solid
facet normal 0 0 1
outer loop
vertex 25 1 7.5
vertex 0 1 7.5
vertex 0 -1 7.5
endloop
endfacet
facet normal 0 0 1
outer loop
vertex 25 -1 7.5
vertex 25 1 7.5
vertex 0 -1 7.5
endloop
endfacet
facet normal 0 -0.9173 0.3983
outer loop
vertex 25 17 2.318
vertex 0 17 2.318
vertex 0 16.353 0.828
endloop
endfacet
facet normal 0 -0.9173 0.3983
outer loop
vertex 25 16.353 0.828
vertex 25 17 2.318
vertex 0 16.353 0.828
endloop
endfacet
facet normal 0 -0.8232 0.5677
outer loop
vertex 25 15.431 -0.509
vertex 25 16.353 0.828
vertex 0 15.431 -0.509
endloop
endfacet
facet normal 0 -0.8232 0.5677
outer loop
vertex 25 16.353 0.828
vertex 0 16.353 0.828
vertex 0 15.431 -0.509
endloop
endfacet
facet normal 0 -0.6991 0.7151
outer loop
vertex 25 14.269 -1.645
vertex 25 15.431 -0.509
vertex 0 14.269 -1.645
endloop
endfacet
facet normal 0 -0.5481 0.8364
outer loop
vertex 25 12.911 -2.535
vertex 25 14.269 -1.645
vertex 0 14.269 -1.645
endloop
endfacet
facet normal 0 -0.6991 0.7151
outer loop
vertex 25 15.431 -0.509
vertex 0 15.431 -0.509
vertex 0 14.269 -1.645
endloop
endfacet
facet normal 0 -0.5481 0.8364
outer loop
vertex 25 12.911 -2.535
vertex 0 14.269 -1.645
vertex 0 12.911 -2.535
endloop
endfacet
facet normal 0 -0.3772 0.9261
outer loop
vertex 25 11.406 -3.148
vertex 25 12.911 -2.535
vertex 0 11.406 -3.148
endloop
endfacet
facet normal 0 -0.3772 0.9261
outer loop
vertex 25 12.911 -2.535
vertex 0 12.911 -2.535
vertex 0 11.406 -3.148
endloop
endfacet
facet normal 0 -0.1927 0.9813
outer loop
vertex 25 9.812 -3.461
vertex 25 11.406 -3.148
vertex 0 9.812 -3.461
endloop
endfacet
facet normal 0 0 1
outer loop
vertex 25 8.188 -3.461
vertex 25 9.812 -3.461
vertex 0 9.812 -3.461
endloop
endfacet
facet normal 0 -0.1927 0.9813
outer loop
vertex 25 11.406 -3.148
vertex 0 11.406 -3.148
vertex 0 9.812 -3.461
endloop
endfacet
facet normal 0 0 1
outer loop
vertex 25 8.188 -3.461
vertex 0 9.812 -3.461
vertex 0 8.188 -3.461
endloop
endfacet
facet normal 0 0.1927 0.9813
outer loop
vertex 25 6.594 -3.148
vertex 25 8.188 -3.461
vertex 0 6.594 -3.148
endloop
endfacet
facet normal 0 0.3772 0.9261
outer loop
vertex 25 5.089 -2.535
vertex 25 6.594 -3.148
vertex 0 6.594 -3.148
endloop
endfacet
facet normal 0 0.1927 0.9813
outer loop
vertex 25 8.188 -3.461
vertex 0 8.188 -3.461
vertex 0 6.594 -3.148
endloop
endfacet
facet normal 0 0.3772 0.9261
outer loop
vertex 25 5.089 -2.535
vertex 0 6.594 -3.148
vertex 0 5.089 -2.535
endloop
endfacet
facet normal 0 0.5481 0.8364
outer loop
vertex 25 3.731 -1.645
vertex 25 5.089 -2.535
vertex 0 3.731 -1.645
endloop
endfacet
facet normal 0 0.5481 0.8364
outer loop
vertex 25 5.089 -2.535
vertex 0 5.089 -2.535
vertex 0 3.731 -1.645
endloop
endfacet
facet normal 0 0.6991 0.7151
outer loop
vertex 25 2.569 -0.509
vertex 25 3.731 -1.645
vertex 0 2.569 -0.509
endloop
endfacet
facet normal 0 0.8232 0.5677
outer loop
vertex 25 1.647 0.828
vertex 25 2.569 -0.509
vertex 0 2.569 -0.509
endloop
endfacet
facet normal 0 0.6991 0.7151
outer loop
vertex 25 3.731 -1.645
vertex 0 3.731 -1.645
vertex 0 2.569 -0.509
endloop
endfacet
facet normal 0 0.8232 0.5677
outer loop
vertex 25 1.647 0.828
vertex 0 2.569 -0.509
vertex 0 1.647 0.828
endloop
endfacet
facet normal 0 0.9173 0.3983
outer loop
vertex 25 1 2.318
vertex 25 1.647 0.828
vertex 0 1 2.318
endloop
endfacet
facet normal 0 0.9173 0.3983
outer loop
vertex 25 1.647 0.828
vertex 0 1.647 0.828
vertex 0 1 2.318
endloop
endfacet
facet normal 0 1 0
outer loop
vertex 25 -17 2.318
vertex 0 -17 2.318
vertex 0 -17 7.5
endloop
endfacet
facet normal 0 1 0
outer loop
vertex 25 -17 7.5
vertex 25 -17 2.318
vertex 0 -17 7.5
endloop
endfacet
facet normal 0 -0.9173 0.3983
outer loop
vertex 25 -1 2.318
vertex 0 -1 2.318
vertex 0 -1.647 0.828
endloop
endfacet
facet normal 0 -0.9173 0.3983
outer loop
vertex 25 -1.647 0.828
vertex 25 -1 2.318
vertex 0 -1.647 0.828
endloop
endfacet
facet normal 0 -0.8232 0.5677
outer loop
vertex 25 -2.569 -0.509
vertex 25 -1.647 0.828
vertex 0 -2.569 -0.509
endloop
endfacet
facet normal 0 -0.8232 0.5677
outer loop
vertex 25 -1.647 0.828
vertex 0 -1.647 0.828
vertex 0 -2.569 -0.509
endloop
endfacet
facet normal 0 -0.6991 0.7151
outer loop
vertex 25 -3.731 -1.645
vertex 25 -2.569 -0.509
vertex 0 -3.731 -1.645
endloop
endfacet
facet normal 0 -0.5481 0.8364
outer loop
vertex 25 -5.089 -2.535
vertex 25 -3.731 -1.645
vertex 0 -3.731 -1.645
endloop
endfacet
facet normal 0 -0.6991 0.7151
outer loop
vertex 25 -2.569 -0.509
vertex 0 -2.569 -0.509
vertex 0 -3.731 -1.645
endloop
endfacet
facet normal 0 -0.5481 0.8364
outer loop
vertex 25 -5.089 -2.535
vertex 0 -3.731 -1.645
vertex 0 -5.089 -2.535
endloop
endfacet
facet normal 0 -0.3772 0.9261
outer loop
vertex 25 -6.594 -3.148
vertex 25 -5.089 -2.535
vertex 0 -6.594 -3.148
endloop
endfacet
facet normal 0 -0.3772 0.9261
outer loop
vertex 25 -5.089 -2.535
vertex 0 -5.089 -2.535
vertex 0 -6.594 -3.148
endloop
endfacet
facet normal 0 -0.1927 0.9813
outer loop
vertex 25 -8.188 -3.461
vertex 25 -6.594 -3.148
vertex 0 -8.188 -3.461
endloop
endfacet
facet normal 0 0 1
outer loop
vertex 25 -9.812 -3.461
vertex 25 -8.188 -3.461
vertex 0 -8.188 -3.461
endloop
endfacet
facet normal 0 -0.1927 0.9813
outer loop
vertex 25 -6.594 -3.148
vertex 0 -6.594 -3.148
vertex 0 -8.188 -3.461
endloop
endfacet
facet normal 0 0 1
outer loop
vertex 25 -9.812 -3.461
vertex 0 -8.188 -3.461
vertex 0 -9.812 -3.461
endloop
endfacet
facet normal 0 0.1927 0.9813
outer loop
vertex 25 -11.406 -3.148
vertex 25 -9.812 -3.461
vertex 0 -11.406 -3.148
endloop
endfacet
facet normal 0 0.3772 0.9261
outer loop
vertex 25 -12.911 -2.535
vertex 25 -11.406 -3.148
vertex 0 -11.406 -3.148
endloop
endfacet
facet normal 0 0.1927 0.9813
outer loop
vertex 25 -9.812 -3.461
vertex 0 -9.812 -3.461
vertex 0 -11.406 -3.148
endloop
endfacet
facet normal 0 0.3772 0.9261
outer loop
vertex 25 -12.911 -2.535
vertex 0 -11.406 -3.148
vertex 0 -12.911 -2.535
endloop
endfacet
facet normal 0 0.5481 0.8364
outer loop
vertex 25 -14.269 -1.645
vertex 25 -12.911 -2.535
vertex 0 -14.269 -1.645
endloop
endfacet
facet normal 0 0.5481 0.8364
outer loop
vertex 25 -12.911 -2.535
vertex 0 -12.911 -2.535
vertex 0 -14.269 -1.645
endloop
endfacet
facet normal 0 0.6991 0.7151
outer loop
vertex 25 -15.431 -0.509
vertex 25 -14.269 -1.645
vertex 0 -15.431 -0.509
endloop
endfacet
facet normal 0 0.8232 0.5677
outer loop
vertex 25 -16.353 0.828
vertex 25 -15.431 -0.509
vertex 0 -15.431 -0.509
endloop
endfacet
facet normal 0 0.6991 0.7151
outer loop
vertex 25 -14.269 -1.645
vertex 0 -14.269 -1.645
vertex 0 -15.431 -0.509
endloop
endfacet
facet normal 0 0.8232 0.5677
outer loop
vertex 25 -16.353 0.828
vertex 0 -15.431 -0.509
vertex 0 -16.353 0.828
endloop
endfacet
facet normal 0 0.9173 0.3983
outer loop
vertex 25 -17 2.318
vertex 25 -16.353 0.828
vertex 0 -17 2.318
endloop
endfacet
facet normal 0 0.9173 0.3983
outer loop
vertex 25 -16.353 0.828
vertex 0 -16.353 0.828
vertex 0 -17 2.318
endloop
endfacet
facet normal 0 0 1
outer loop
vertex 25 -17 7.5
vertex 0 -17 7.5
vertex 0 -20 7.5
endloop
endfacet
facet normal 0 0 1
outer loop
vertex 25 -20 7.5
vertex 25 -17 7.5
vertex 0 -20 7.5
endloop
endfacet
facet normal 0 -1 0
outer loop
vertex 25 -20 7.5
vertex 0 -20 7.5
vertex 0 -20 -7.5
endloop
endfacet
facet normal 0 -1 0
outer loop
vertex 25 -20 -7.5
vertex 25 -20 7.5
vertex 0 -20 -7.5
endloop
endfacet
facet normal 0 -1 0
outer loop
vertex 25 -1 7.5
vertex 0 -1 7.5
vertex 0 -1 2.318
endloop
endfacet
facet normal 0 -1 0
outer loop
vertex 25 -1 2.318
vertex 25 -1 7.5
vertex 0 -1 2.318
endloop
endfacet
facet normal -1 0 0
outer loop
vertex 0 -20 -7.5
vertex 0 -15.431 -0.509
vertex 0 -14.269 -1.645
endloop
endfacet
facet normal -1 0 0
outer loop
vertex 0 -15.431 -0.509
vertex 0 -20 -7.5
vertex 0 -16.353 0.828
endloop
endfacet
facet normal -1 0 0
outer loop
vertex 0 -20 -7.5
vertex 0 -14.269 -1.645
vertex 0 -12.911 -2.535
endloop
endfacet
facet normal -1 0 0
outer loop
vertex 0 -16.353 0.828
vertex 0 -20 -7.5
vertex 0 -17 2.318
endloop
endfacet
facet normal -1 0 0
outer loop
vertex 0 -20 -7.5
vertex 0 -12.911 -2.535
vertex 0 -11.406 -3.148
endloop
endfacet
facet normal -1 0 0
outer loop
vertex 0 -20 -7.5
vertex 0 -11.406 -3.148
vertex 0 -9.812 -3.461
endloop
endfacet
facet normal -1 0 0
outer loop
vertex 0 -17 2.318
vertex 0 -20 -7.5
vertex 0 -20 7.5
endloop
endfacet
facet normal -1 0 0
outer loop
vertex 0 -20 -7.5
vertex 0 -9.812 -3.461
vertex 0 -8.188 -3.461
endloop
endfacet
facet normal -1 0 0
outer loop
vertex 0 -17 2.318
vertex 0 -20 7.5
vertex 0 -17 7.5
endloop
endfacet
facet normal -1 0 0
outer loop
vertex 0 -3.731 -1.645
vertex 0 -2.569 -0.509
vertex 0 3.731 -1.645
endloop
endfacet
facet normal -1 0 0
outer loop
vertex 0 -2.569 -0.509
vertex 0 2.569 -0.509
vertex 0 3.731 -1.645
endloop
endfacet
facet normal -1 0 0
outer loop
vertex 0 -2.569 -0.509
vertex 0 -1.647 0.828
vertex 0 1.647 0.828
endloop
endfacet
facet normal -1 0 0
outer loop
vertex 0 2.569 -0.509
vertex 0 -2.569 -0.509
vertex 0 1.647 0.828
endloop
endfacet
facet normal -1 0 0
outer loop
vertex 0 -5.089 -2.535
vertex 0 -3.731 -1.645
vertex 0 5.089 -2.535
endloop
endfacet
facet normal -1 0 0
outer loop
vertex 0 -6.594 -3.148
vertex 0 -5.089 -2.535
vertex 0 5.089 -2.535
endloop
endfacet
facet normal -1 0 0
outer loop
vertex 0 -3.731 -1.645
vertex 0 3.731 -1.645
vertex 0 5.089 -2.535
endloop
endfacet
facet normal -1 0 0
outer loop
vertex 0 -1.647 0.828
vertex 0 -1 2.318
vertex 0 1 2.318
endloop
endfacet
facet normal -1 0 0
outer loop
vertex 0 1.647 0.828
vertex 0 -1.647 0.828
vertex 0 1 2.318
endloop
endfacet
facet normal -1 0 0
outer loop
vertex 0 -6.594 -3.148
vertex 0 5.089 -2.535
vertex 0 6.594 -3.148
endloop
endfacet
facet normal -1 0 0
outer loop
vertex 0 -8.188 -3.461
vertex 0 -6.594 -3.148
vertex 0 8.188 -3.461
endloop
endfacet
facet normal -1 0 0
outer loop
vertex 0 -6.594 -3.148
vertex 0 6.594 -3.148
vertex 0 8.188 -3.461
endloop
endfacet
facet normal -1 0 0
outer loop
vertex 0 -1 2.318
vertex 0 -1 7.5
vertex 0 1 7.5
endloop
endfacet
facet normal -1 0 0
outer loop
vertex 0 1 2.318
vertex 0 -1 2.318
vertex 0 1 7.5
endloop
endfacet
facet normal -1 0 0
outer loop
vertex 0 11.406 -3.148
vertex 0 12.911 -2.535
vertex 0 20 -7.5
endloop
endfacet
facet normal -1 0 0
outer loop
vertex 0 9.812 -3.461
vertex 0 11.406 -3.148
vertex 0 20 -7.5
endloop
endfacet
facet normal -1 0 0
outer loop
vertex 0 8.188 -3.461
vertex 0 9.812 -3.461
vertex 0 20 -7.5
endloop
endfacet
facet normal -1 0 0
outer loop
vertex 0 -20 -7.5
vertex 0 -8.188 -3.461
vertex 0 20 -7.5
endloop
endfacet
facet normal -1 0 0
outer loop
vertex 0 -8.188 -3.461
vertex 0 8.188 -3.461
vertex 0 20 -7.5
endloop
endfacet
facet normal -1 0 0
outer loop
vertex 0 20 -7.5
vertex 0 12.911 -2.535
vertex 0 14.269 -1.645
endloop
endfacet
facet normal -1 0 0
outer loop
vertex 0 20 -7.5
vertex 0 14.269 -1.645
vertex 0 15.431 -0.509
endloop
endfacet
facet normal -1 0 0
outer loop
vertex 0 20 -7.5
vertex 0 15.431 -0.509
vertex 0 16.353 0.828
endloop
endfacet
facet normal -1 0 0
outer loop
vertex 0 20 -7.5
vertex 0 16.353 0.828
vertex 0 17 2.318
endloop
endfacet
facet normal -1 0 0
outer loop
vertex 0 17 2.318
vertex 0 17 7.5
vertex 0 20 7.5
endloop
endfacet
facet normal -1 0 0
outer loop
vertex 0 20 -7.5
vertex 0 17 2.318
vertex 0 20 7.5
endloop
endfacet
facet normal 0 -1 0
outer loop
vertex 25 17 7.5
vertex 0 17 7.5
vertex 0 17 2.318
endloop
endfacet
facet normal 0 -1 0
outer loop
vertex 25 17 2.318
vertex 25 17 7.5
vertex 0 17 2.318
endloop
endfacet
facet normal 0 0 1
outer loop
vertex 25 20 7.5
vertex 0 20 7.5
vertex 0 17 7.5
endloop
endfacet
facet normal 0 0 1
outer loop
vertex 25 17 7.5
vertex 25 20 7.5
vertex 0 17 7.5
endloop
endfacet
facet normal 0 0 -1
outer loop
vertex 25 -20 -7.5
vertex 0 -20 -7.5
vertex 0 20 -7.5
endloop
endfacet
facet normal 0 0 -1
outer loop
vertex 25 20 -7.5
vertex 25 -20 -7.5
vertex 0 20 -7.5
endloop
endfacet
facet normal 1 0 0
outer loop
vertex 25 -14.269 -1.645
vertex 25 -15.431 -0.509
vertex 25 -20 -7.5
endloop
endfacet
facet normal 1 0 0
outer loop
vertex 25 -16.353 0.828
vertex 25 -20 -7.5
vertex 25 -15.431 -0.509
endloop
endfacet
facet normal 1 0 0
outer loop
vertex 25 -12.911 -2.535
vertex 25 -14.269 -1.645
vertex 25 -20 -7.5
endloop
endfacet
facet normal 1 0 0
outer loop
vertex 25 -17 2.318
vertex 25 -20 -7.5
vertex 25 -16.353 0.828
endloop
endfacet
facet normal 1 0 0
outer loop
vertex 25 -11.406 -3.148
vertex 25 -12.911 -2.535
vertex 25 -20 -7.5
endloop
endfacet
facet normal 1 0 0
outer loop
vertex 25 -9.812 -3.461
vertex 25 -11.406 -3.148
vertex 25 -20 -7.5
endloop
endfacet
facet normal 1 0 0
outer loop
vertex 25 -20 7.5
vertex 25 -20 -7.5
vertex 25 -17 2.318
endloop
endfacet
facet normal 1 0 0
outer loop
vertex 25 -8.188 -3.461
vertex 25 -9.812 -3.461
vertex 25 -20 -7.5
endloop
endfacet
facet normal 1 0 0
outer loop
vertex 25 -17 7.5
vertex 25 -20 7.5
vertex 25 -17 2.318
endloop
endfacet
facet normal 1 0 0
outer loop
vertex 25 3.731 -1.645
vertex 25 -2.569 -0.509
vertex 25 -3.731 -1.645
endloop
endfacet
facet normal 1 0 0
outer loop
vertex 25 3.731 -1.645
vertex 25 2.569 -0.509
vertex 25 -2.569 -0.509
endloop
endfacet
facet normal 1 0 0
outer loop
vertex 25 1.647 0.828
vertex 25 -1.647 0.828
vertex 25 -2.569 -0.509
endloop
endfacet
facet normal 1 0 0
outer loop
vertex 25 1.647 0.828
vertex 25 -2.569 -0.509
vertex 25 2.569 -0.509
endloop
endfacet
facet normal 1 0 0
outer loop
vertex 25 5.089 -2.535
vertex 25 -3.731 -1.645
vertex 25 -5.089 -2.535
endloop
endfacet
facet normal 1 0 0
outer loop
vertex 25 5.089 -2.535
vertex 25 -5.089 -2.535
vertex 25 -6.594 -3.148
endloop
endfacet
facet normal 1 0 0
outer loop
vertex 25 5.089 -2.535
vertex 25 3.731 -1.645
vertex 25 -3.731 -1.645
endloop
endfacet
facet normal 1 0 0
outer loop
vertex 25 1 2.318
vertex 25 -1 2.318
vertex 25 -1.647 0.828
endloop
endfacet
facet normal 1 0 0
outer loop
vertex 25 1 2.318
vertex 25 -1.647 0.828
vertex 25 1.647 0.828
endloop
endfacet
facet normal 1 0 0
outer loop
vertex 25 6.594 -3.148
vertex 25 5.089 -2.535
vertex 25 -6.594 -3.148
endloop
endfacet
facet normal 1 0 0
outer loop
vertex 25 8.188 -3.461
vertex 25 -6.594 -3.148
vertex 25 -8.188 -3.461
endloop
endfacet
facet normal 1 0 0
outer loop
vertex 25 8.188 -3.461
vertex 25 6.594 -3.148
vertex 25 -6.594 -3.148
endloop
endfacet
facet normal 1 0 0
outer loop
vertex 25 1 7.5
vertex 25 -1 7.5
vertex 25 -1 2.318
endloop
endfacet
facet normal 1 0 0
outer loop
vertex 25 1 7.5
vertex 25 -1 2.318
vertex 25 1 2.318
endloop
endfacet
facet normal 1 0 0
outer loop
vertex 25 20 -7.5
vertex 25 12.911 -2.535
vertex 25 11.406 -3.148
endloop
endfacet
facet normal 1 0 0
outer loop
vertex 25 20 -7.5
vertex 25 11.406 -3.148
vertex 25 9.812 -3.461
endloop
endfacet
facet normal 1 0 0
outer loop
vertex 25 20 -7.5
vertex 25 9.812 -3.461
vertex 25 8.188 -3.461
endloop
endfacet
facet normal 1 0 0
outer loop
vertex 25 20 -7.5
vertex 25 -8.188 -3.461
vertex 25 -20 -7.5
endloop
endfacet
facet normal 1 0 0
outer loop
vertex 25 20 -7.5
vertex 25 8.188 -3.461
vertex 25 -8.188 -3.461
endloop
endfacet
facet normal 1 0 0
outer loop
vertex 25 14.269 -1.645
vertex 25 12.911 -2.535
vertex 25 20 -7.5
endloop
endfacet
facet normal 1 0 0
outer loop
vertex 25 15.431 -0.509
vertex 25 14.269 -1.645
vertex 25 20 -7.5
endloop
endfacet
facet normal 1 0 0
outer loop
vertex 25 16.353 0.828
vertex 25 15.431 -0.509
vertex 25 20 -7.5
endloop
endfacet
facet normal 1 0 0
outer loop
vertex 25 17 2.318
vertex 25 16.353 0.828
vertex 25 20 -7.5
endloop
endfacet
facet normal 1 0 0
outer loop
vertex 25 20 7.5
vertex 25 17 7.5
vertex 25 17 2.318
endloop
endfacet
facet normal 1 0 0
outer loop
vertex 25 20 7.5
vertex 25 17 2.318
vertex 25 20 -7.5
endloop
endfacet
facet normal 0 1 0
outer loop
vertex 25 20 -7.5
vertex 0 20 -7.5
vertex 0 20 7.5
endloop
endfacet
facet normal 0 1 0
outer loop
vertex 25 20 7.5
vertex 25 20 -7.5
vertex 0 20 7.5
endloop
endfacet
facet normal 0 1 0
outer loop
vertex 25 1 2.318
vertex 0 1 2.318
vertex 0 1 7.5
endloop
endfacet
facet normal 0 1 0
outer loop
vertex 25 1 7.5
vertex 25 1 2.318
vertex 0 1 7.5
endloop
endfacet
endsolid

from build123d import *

# Parameters (mm, degrees)
F1_DEPTH = 25


with BuildPart() as f1:
    # F0 (on Right) → F1 (new body)
    with BuildSketch(Plane.YZ):
        with BuildLine():
            Line((-20, -7.5), (20, -7.5))
            Line((20, -7.5), (20, 7.5))
            Line((20, 7.5), (17, 7.5))
            Line((17, 7.5), (17, 2.318182))
            ThreePointArc((17, 2.318182), (9, -3.5), (1, 2.318182))
            Line((1, 2.318182), (1, 7.5))
            Line((1, 7.5), (-1, 7.5))
            Line((-1, 7.5), (-1, 2.318182))
            ThreePointArc((-1, 2.318182), (-9, -3.5), (-17, 2.318182))
            Line((-17, 2.318182), (-17, 7.5))
            Line((-17, 7.5), (-20, 7.5))
            Line((-20, 7.5), (-20, -7.5))
        make_face()
    extrude(amount=F1_DEPTH)


solid = f1.part
